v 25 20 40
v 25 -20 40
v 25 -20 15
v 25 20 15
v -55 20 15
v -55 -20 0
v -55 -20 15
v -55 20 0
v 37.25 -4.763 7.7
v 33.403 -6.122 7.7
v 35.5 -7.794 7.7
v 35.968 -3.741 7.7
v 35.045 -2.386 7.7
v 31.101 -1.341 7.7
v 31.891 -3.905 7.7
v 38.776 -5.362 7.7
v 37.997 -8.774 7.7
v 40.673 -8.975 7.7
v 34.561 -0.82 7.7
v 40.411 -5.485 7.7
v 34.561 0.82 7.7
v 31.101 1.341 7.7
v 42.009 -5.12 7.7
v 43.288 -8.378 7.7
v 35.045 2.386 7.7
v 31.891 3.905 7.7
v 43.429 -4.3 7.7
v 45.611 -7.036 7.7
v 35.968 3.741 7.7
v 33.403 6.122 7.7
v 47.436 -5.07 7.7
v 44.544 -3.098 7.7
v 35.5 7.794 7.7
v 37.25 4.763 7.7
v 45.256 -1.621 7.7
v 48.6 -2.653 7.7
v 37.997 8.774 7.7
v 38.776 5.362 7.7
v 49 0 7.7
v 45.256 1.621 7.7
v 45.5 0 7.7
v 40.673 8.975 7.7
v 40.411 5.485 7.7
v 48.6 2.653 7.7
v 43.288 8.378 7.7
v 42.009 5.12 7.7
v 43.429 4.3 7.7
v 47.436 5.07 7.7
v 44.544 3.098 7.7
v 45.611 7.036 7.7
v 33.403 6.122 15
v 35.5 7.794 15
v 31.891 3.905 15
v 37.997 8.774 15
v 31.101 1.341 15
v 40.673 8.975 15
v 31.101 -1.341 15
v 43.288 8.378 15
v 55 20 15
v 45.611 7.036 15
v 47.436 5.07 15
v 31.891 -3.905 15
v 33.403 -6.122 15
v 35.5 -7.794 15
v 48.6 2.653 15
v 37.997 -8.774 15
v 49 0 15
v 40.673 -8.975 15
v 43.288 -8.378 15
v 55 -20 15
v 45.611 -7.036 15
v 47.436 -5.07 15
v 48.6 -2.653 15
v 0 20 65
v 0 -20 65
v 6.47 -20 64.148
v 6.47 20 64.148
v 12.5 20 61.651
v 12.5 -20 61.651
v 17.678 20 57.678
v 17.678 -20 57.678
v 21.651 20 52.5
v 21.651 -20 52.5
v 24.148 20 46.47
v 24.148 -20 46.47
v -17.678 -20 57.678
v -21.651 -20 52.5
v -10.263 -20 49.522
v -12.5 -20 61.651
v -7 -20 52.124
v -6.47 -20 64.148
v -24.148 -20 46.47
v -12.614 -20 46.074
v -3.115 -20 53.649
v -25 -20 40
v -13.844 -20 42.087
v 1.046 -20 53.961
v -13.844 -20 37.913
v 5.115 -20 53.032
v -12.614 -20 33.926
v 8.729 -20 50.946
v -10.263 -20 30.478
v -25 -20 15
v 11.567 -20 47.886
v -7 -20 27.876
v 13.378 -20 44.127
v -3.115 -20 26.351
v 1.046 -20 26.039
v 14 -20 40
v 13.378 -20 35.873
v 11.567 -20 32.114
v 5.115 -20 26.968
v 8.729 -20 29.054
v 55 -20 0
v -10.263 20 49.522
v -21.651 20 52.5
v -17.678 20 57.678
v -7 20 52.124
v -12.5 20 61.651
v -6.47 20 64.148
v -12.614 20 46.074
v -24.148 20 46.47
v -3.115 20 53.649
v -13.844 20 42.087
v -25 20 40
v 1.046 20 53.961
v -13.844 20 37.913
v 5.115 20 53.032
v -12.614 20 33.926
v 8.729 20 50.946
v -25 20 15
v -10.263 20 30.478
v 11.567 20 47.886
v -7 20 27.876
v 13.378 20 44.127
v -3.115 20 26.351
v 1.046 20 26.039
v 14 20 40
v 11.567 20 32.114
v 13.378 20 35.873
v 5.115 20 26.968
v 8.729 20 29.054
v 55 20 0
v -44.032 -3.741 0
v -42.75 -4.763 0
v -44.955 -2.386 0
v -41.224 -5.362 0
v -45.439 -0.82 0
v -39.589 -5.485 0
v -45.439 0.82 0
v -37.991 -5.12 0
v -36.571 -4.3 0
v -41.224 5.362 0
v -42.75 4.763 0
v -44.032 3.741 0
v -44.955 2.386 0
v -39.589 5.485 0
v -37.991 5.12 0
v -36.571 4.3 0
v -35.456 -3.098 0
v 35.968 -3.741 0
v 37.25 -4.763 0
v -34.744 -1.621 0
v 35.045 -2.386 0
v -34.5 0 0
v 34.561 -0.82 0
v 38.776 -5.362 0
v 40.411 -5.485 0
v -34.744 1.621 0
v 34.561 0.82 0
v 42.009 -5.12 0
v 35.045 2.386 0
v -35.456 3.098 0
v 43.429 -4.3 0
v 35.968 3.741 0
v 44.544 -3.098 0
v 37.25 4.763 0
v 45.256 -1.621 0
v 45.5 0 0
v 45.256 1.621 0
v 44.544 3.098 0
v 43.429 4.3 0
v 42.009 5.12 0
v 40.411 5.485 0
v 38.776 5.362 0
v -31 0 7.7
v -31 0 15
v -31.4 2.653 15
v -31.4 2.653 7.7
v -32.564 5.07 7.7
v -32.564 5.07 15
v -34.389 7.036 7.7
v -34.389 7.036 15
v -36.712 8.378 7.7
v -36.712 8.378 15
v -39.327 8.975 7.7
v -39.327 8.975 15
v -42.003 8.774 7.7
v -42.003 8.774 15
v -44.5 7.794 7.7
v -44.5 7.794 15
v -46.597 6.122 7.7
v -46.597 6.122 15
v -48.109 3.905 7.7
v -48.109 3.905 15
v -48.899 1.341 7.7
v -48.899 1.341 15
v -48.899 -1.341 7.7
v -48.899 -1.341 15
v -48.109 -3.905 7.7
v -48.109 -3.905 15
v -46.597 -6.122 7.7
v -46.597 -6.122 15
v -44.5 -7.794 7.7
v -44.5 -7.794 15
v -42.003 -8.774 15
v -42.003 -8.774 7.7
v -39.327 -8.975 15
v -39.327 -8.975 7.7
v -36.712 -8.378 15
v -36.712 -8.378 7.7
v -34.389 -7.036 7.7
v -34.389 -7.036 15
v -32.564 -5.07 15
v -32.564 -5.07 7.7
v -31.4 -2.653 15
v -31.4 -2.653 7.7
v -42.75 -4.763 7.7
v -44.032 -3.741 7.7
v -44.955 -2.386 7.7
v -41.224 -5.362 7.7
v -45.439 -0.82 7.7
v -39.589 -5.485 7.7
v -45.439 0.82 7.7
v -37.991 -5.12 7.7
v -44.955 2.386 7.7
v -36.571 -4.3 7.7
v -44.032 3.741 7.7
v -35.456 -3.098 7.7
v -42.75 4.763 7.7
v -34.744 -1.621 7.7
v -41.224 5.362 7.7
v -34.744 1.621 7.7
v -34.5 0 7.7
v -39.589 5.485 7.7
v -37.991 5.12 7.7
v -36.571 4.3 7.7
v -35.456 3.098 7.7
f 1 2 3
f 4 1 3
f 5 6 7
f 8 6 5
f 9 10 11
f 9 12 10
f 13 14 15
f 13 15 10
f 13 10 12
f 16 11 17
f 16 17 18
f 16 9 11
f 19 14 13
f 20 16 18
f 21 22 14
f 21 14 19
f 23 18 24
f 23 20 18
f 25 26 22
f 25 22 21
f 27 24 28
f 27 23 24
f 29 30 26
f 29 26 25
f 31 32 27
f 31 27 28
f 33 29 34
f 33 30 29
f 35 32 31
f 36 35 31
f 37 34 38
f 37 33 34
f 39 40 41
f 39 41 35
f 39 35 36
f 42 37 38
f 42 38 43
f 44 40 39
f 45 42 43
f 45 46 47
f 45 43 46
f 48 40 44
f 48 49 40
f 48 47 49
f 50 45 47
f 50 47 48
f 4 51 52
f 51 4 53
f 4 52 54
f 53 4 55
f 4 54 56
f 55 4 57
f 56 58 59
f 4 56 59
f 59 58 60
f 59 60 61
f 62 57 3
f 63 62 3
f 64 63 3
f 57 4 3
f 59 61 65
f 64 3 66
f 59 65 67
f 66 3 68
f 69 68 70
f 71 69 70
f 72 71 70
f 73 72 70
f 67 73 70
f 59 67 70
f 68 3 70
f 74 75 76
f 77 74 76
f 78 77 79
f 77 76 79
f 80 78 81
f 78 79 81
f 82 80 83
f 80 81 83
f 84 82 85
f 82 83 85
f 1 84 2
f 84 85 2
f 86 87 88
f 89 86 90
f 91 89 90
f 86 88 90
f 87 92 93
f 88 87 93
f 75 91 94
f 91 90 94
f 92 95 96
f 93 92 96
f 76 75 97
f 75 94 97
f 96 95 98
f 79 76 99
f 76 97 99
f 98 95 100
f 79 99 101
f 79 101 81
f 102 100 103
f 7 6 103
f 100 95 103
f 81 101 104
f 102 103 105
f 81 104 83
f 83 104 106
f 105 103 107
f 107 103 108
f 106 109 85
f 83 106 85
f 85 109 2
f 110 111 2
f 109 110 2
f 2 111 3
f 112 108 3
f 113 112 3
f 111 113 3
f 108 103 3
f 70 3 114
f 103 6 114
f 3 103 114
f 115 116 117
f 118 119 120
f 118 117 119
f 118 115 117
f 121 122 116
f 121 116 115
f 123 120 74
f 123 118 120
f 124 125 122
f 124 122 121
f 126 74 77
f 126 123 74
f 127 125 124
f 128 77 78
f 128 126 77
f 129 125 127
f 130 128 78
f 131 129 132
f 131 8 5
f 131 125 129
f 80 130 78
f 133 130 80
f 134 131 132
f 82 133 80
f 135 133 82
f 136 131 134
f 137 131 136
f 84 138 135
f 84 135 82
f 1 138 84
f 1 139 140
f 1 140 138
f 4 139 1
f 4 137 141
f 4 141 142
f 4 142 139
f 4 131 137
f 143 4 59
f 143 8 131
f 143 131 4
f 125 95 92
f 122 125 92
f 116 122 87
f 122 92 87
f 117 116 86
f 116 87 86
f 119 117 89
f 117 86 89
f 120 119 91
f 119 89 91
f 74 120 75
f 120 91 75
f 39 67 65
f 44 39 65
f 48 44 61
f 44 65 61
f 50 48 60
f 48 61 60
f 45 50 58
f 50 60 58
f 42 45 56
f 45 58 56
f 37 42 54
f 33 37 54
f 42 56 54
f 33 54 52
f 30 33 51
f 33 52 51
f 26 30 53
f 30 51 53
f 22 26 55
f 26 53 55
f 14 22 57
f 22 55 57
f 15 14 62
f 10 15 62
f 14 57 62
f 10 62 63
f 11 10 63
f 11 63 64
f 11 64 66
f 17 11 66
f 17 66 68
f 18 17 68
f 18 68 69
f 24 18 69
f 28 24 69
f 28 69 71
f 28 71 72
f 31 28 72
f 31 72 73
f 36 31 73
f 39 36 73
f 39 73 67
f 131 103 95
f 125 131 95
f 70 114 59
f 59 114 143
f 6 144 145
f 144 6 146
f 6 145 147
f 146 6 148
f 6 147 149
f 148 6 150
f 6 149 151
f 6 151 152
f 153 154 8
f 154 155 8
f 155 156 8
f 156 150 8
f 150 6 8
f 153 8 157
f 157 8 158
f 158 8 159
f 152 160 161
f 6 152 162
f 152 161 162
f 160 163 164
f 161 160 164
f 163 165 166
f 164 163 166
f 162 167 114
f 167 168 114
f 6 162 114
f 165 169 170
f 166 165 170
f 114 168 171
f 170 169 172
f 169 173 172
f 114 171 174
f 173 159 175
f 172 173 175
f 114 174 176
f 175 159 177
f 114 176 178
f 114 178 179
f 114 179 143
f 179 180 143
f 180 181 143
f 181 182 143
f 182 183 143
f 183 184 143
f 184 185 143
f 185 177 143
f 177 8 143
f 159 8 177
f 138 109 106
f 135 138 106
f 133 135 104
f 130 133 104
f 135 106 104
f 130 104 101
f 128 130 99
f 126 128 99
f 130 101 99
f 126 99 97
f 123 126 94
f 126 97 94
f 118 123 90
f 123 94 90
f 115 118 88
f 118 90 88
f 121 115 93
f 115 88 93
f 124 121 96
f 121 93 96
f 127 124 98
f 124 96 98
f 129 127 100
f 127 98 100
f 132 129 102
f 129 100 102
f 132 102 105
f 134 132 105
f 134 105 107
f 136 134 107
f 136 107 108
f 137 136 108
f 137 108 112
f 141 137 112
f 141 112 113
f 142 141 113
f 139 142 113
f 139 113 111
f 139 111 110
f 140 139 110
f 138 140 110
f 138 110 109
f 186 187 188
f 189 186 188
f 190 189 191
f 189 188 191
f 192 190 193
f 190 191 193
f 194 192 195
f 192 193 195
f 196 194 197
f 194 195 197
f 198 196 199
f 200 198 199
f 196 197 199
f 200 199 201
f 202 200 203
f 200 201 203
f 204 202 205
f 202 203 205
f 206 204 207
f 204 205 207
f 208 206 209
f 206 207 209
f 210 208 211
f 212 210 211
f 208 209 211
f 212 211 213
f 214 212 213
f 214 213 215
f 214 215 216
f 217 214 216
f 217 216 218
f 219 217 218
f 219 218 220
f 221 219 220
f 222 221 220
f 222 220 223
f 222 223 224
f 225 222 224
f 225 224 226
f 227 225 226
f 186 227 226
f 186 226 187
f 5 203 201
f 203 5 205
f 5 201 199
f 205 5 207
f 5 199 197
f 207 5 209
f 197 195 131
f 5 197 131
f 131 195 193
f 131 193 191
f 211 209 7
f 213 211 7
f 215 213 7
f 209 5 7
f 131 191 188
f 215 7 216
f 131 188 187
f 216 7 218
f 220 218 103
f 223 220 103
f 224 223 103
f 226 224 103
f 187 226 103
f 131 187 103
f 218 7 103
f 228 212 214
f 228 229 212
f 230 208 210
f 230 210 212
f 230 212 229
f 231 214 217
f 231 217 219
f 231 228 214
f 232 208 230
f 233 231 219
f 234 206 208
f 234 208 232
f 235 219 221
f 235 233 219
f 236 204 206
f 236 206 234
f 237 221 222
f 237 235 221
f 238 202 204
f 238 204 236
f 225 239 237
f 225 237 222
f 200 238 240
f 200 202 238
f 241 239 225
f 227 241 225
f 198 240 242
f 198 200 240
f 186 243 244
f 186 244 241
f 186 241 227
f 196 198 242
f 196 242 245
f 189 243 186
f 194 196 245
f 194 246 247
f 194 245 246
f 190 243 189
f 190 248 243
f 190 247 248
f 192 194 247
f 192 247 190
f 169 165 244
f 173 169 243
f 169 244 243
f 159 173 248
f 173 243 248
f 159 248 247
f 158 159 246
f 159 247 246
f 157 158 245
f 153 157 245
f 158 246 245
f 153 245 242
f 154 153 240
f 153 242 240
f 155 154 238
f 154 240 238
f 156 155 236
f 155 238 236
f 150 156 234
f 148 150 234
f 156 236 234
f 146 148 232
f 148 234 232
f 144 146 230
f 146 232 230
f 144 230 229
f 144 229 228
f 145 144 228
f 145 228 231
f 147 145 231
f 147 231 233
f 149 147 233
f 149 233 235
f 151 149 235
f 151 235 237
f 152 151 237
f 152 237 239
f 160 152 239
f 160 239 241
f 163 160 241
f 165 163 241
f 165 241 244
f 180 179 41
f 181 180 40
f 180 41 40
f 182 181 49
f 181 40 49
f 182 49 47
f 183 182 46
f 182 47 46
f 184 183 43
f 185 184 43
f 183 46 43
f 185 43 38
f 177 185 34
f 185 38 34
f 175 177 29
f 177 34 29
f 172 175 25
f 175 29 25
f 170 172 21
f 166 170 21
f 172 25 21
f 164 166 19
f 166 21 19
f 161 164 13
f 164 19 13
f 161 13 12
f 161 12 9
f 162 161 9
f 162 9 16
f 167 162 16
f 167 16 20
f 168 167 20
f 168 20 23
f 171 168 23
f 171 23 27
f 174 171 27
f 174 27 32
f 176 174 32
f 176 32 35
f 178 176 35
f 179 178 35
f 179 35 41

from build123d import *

# Parameters (mm, degrees)
F0_W     = 110
F0_H     = 40
F1_DEPTH = 65
F2_R     = 5.5
F3_DEPTH = 80
F2_R_2   = 9
F4_DEPTH = 57.3
F5_R     = 14
F6_DEPTH = 80


with BuildPart() as f1:
    # F0 (on Top) → F1 (new body)
    with BuildSketch(Plane.XY):
        Rectangle(F0_W, F0_H)
    extrude(amount=F1_DEPTH)

    # F2 (on face) → F3 (cut)
    with BuildSketch(Plane.XY.offset(65)):
        with Locations((-40, 0)):
            Circle(F2_R)
        with Locations((40, 0)):
            Circle(F2_R)
    extrude(amount=-F3_DEPTH, mode=Mode.SUBTRACT)

    # F2 (on face) → F4 (cut)
    with BuildSketch(Plane.XY.offset(65)):
        with Locations((-40, 0)):
            Circle(F2_R_2)
        with Locations((-40, 0)):
            Circle(F2_R, mode=Mode.SUBTRACT)
        with Locations((40, 0)):
            Circle(F2_R_2)
        with Locations((40, 0)):
            Circle(F2_R, mode=Mode.SUBTRACT)
    extrude(amount=-F4_DEPTH, mode=Mode.SUBTRACT)

    # F5 (on face) → F6 (cut)
    with BuildSketch(Plane.XZ.offset(20)):
        with Locations((0, 40)):
            Circle(F5_R)
        with BuildLine():
            Line((-55, 65), (-55, 15))
            Line((-55, 15), (-25, 15))
            Line((-25, 15), (-25, 40))
            ThreePointArc((-25, 40), (-17.67767, 57.67767), (0, 65))
            Line((0, 65), (-55, 65))
        make_face()
        with BuildLine():
            Line((55, 65), (0, 65))
            ThreePointArc((0, 65), (17.67767, 57.67767), (25, 40))
            Line((25, 40), (25, 15))
            Line((25, 15), (55, 15))
            Line((55, 15), (55, 65))
        make_face()
    extrude(amount=-F6_DEPTH, mode=Mode.SUBTRACT)


solid = f1.part
